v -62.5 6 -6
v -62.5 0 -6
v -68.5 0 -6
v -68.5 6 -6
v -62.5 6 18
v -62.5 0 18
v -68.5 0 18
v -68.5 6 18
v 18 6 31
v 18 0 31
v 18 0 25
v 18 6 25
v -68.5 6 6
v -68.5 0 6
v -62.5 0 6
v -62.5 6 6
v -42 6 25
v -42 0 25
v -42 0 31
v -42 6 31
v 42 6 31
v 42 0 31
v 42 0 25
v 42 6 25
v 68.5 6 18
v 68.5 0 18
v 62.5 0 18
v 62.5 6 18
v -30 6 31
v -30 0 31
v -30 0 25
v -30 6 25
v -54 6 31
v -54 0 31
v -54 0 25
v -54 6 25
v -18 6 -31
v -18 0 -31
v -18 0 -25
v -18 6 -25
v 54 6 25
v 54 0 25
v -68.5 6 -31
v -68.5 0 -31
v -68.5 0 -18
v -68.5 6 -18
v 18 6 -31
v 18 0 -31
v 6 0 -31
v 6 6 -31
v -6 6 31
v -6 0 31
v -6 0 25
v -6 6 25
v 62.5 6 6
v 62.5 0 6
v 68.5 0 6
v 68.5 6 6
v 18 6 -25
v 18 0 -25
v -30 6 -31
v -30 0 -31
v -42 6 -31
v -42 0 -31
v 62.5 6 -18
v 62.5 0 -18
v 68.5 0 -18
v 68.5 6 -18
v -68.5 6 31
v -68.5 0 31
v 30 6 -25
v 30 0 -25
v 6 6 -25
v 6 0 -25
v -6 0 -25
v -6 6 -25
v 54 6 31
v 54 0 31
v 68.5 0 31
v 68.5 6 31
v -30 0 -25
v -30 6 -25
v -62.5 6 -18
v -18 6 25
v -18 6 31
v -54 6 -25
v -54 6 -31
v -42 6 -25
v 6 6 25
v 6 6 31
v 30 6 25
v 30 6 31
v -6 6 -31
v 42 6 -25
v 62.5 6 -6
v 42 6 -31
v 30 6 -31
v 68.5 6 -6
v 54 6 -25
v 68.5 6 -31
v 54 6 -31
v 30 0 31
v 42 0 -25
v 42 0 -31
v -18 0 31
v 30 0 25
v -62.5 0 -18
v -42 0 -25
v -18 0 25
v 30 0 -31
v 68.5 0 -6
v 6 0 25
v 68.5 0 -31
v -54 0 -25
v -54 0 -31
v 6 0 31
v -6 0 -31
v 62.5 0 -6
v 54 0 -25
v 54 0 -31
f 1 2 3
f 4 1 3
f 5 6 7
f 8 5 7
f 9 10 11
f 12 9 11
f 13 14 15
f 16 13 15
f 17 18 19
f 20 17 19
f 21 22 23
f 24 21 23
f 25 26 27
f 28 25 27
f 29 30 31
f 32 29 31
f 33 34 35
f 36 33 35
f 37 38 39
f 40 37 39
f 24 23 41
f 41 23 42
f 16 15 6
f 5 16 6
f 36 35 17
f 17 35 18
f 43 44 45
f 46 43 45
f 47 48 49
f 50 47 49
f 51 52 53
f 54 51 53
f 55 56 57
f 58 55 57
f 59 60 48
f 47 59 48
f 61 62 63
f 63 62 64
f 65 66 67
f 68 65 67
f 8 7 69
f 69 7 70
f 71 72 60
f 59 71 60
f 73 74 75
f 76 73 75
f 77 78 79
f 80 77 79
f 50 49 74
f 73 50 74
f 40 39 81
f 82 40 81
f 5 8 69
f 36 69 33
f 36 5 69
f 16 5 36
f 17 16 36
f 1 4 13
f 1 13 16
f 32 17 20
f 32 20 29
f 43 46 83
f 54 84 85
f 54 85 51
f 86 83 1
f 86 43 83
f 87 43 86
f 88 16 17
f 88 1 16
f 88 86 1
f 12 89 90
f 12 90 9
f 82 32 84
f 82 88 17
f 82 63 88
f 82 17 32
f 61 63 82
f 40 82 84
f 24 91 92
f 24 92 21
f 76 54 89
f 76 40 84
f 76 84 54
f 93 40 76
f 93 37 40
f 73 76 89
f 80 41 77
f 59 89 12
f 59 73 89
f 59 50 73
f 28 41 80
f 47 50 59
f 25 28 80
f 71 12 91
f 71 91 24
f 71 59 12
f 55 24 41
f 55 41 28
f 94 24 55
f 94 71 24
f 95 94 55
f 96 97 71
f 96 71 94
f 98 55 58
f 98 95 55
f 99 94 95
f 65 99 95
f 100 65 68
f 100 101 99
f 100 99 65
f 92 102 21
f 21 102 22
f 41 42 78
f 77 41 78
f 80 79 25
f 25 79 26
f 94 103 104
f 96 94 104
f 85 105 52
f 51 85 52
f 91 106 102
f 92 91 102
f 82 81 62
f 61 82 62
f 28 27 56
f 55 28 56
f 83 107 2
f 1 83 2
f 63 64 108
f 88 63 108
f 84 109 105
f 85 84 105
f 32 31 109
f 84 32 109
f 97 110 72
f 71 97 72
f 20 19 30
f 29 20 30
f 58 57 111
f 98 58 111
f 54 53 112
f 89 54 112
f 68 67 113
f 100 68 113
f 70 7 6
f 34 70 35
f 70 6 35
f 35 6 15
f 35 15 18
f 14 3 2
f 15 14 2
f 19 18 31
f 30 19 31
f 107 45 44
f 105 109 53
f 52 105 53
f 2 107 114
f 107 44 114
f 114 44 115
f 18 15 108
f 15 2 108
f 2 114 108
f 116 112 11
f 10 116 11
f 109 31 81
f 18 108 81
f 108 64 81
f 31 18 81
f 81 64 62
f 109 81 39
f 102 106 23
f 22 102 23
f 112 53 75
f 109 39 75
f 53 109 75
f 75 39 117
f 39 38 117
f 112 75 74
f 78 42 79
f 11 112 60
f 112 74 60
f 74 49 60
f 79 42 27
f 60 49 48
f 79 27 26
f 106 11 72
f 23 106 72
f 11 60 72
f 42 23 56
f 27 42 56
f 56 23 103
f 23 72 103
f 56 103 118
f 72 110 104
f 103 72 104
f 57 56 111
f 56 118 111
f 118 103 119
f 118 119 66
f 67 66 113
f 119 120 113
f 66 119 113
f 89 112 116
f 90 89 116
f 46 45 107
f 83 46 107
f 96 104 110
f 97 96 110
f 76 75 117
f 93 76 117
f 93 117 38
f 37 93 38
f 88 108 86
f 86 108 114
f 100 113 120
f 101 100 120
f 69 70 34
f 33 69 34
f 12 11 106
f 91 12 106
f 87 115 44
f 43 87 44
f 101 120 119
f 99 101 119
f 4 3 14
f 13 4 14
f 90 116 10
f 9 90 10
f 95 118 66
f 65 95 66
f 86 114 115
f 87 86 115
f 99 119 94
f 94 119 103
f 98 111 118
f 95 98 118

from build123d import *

# Parameters (mm, degrees)
BOSS_EXTRUDE1_DEPTH = 6


with BuildPart() as part:
    # Sketch1 → Boss-Extrude1 (new body)
    with BuildSketch(Plane(origin=(0, 0, 0), x_dir=(1, 0, 0), z_dir=(0, 1, 0))):
        Polygon((-54, -31), (-54, -25), (-42, -25), (-42, -31), (-30, -31), (-30, -25), (-18, -25), (-18, -31), (-6, -31), (-6, -25), (6, -25), (6, -31), (18, -31), (18, -25), (30, -25), (30, -31), (42, -31), (42, -25), (54, -25), (54, -31), (66, -31), (68.499999877, -31), (68.499999877, -17.999998649), (66.000000123, -17.999998649), (62.500000123, -17.999998649), (62.500000123, -5.999998649), (66.000000123, -5.999998649), (68.499999877, -5.999998649), (68.499999877, 6), (66.000000123, 6), (62.500000123, 6), (62.500000123, 18), (66.000000123, 18), (68.499999877, 18), (68.499999877, 31), (66, 31), (54, 31), (54, 25), (42, 25), (42, 31), (30, 31), (30, 25), (18, 25), (18, 31), (6, 31), (6, 25), (-6, 25), (-6, 31), (-18, 31), (-18, 25), (-30, 25), (-30, 31), (-42, 31), (-42, 25), (-54, 25), (-54, 31), (-66, 31), (-68.499999877, 31), (-68.499999877, 18), (-66.000000123, 18), (-62.500000123, 18), (-62.500000123, 6), (-66.000000123, 6), (-68.499999877, 6), (-68.499999877, -5.999998649), (-66.000000123, -5.999998649), (-62.500000123, -5.999998649), (-62.500000123, -17.999998649), (-66.000000123, -17.999998649), (-68.499999877, -17.999998649), (-68.499999877, -31), (-66, -31), align=None)
    extrude(amount=BOSS_EXTRUDE1_DEPTH)


solid = part.part
